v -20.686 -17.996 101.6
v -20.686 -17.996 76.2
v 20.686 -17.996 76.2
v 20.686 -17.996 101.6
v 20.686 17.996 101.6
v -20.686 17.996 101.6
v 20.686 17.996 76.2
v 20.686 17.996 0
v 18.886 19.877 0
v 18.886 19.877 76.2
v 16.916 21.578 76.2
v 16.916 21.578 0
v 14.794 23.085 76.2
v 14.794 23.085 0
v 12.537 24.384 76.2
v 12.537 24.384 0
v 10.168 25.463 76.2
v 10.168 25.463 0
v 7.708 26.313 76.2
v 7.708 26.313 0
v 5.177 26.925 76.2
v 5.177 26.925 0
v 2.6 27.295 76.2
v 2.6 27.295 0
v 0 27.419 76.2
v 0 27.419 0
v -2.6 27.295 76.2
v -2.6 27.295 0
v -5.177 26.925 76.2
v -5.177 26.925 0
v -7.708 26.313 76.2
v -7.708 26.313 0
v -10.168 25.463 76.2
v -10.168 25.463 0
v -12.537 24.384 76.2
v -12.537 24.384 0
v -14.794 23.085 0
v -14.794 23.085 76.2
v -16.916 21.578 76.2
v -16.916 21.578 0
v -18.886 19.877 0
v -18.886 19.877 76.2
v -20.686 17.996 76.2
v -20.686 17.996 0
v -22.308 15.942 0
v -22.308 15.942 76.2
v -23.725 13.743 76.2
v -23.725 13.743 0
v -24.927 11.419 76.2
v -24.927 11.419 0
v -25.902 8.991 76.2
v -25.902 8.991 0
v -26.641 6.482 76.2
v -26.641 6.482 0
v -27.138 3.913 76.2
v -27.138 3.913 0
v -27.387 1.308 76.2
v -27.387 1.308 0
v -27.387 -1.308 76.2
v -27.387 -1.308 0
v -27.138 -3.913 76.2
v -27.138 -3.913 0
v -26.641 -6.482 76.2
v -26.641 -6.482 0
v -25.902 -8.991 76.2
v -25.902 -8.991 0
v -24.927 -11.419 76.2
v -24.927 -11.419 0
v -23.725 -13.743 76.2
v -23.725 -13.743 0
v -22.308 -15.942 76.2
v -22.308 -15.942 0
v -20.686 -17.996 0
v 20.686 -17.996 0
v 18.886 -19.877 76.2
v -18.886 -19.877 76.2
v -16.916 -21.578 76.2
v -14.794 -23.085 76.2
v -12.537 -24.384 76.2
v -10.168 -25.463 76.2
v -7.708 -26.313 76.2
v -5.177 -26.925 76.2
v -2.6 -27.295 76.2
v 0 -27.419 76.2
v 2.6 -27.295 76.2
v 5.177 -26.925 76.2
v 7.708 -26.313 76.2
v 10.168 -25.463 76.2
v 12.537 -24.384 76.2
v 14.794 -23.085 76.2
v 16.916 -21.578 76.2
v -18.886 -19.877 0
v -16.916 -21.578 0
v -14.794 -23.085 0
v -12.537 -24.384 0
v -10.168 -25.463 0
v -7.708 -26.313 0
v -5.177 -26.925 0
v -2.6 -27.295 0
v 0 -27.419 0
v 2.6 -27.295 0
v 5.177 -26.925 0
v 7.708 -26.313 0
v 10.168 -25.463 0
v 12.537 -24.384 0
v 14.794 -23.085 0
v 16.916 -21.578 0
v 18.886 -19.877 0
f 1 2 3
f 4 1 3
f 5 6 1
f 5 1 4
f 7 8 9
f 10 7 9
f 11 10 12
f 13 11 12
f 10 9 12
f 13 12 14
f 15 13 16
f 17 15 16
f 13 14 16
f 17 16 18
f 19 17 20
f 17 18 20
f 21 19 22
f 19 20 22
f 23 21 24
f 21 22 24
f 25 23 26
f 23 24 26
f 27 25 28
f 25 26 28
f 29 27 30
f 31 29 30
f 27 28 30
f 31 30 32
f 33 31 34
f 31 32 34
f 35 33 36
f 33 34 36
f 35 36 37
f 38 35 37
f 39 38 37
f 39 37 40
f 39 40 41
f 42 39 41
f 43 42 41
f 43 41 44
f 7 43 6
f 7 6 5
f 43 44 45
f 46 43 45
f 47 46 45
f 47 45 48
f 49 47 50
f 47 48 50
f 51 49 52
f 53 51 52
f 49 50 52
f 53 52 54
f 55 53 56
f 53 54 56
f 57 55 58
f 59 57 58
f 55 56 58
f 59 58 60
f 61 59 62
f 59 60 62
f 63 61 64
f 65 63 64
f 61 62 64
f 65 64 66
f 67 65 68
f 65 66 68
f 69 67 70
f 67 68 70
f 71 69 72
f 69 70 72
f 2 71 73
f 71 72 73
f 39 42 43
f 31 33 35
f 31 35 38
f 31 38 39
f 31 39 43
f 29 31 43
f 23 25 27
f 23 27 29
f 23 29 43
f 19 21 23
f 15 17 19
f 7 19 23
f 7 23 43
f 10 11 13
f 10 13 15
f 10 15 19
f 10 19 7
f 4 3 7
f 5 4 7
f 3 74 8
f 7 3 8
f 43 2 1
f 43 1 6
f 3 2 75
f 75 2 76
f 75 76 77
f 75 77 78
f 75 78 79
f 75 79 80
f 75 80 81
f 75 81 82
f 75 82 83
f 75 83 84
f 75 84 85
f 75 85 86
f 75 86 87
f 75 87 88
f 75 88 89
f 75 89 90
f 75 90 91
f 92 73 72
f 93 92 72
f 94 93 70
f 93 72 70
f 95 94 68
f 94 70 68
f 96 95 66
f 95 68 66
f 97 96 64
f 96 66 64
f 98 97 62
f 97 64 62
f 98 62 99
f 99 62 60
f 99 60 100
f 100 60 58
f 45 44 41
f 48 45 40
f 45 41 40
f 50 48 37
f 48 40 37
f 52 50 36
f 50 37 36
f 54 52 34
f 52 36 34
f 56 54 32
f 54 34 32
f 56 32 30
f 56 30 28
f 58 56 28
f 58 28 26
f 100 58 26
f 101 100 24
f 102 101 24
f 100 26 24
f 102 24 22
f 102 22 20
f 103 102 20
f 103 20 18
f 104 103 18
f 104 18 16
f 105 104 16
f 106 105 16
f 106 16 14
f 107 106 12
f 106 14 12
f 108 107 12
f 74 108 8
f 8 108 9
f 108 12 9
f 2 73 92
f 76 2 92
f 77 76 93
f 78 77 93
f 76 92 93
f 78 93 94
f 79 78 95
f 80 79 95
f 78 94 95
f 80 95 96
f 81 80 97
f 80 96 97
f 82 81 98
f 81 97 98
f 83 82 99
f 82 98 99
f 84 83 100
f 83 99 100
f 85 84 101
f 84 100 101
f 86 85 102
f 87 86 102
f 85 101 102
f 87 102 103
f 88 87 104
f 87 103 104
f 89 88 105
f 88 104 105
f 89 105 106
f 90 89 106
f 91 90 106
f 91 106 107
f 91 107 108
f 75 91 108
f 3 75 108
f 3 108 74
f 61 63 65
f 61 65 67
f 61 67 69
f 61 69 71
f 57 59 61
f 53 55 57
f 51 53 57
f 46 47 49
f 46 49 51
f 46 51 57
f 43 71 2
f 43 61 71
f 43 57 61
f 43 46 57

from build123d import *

# Parameters (mm, degrees)
F0_W     = 41.372892
F0_H     = 35.991504
F1_DEPTH = 101.6
F2_DEPTH = 76.2


with BuildPart() as f1:
    # F0 (on Top) → F1 (new body)
    with BuildSketch(Plane.XY):
        Rectangle(F0_W, F0_H)
    extrude(amount=F1_DEPTH)

    # F0 (on Top) → F2 (join)
    with BuildSketch(Plane.XY):
        with BuildLine():
            Line((-20.686446, 17.995752), (20.686446, 17.995752))
            ThreePointArc((20.686446, 17.995752), (0, 27.418536), (-20.686446, 17.995752))
        make_face()
        with BuildLine():
            Line((-20.686446, -17.995752), (-20.686446, 17.995752))
            ThreePointArc((-20.686446, 17.995752), (-27.418536, 0), (-20.686446, -17.995752))
        make_face()
        with BuildLine():
            ThreePointArc((-20.686446, -17.995752), (0, -27.418536), (20.686446, -17.995752))
            Line((20.686446, -17.995752), (-20.686446, -17.995752))
        make_face()
    extrude(amount=F2_DEPTH)


solid = f1.part
